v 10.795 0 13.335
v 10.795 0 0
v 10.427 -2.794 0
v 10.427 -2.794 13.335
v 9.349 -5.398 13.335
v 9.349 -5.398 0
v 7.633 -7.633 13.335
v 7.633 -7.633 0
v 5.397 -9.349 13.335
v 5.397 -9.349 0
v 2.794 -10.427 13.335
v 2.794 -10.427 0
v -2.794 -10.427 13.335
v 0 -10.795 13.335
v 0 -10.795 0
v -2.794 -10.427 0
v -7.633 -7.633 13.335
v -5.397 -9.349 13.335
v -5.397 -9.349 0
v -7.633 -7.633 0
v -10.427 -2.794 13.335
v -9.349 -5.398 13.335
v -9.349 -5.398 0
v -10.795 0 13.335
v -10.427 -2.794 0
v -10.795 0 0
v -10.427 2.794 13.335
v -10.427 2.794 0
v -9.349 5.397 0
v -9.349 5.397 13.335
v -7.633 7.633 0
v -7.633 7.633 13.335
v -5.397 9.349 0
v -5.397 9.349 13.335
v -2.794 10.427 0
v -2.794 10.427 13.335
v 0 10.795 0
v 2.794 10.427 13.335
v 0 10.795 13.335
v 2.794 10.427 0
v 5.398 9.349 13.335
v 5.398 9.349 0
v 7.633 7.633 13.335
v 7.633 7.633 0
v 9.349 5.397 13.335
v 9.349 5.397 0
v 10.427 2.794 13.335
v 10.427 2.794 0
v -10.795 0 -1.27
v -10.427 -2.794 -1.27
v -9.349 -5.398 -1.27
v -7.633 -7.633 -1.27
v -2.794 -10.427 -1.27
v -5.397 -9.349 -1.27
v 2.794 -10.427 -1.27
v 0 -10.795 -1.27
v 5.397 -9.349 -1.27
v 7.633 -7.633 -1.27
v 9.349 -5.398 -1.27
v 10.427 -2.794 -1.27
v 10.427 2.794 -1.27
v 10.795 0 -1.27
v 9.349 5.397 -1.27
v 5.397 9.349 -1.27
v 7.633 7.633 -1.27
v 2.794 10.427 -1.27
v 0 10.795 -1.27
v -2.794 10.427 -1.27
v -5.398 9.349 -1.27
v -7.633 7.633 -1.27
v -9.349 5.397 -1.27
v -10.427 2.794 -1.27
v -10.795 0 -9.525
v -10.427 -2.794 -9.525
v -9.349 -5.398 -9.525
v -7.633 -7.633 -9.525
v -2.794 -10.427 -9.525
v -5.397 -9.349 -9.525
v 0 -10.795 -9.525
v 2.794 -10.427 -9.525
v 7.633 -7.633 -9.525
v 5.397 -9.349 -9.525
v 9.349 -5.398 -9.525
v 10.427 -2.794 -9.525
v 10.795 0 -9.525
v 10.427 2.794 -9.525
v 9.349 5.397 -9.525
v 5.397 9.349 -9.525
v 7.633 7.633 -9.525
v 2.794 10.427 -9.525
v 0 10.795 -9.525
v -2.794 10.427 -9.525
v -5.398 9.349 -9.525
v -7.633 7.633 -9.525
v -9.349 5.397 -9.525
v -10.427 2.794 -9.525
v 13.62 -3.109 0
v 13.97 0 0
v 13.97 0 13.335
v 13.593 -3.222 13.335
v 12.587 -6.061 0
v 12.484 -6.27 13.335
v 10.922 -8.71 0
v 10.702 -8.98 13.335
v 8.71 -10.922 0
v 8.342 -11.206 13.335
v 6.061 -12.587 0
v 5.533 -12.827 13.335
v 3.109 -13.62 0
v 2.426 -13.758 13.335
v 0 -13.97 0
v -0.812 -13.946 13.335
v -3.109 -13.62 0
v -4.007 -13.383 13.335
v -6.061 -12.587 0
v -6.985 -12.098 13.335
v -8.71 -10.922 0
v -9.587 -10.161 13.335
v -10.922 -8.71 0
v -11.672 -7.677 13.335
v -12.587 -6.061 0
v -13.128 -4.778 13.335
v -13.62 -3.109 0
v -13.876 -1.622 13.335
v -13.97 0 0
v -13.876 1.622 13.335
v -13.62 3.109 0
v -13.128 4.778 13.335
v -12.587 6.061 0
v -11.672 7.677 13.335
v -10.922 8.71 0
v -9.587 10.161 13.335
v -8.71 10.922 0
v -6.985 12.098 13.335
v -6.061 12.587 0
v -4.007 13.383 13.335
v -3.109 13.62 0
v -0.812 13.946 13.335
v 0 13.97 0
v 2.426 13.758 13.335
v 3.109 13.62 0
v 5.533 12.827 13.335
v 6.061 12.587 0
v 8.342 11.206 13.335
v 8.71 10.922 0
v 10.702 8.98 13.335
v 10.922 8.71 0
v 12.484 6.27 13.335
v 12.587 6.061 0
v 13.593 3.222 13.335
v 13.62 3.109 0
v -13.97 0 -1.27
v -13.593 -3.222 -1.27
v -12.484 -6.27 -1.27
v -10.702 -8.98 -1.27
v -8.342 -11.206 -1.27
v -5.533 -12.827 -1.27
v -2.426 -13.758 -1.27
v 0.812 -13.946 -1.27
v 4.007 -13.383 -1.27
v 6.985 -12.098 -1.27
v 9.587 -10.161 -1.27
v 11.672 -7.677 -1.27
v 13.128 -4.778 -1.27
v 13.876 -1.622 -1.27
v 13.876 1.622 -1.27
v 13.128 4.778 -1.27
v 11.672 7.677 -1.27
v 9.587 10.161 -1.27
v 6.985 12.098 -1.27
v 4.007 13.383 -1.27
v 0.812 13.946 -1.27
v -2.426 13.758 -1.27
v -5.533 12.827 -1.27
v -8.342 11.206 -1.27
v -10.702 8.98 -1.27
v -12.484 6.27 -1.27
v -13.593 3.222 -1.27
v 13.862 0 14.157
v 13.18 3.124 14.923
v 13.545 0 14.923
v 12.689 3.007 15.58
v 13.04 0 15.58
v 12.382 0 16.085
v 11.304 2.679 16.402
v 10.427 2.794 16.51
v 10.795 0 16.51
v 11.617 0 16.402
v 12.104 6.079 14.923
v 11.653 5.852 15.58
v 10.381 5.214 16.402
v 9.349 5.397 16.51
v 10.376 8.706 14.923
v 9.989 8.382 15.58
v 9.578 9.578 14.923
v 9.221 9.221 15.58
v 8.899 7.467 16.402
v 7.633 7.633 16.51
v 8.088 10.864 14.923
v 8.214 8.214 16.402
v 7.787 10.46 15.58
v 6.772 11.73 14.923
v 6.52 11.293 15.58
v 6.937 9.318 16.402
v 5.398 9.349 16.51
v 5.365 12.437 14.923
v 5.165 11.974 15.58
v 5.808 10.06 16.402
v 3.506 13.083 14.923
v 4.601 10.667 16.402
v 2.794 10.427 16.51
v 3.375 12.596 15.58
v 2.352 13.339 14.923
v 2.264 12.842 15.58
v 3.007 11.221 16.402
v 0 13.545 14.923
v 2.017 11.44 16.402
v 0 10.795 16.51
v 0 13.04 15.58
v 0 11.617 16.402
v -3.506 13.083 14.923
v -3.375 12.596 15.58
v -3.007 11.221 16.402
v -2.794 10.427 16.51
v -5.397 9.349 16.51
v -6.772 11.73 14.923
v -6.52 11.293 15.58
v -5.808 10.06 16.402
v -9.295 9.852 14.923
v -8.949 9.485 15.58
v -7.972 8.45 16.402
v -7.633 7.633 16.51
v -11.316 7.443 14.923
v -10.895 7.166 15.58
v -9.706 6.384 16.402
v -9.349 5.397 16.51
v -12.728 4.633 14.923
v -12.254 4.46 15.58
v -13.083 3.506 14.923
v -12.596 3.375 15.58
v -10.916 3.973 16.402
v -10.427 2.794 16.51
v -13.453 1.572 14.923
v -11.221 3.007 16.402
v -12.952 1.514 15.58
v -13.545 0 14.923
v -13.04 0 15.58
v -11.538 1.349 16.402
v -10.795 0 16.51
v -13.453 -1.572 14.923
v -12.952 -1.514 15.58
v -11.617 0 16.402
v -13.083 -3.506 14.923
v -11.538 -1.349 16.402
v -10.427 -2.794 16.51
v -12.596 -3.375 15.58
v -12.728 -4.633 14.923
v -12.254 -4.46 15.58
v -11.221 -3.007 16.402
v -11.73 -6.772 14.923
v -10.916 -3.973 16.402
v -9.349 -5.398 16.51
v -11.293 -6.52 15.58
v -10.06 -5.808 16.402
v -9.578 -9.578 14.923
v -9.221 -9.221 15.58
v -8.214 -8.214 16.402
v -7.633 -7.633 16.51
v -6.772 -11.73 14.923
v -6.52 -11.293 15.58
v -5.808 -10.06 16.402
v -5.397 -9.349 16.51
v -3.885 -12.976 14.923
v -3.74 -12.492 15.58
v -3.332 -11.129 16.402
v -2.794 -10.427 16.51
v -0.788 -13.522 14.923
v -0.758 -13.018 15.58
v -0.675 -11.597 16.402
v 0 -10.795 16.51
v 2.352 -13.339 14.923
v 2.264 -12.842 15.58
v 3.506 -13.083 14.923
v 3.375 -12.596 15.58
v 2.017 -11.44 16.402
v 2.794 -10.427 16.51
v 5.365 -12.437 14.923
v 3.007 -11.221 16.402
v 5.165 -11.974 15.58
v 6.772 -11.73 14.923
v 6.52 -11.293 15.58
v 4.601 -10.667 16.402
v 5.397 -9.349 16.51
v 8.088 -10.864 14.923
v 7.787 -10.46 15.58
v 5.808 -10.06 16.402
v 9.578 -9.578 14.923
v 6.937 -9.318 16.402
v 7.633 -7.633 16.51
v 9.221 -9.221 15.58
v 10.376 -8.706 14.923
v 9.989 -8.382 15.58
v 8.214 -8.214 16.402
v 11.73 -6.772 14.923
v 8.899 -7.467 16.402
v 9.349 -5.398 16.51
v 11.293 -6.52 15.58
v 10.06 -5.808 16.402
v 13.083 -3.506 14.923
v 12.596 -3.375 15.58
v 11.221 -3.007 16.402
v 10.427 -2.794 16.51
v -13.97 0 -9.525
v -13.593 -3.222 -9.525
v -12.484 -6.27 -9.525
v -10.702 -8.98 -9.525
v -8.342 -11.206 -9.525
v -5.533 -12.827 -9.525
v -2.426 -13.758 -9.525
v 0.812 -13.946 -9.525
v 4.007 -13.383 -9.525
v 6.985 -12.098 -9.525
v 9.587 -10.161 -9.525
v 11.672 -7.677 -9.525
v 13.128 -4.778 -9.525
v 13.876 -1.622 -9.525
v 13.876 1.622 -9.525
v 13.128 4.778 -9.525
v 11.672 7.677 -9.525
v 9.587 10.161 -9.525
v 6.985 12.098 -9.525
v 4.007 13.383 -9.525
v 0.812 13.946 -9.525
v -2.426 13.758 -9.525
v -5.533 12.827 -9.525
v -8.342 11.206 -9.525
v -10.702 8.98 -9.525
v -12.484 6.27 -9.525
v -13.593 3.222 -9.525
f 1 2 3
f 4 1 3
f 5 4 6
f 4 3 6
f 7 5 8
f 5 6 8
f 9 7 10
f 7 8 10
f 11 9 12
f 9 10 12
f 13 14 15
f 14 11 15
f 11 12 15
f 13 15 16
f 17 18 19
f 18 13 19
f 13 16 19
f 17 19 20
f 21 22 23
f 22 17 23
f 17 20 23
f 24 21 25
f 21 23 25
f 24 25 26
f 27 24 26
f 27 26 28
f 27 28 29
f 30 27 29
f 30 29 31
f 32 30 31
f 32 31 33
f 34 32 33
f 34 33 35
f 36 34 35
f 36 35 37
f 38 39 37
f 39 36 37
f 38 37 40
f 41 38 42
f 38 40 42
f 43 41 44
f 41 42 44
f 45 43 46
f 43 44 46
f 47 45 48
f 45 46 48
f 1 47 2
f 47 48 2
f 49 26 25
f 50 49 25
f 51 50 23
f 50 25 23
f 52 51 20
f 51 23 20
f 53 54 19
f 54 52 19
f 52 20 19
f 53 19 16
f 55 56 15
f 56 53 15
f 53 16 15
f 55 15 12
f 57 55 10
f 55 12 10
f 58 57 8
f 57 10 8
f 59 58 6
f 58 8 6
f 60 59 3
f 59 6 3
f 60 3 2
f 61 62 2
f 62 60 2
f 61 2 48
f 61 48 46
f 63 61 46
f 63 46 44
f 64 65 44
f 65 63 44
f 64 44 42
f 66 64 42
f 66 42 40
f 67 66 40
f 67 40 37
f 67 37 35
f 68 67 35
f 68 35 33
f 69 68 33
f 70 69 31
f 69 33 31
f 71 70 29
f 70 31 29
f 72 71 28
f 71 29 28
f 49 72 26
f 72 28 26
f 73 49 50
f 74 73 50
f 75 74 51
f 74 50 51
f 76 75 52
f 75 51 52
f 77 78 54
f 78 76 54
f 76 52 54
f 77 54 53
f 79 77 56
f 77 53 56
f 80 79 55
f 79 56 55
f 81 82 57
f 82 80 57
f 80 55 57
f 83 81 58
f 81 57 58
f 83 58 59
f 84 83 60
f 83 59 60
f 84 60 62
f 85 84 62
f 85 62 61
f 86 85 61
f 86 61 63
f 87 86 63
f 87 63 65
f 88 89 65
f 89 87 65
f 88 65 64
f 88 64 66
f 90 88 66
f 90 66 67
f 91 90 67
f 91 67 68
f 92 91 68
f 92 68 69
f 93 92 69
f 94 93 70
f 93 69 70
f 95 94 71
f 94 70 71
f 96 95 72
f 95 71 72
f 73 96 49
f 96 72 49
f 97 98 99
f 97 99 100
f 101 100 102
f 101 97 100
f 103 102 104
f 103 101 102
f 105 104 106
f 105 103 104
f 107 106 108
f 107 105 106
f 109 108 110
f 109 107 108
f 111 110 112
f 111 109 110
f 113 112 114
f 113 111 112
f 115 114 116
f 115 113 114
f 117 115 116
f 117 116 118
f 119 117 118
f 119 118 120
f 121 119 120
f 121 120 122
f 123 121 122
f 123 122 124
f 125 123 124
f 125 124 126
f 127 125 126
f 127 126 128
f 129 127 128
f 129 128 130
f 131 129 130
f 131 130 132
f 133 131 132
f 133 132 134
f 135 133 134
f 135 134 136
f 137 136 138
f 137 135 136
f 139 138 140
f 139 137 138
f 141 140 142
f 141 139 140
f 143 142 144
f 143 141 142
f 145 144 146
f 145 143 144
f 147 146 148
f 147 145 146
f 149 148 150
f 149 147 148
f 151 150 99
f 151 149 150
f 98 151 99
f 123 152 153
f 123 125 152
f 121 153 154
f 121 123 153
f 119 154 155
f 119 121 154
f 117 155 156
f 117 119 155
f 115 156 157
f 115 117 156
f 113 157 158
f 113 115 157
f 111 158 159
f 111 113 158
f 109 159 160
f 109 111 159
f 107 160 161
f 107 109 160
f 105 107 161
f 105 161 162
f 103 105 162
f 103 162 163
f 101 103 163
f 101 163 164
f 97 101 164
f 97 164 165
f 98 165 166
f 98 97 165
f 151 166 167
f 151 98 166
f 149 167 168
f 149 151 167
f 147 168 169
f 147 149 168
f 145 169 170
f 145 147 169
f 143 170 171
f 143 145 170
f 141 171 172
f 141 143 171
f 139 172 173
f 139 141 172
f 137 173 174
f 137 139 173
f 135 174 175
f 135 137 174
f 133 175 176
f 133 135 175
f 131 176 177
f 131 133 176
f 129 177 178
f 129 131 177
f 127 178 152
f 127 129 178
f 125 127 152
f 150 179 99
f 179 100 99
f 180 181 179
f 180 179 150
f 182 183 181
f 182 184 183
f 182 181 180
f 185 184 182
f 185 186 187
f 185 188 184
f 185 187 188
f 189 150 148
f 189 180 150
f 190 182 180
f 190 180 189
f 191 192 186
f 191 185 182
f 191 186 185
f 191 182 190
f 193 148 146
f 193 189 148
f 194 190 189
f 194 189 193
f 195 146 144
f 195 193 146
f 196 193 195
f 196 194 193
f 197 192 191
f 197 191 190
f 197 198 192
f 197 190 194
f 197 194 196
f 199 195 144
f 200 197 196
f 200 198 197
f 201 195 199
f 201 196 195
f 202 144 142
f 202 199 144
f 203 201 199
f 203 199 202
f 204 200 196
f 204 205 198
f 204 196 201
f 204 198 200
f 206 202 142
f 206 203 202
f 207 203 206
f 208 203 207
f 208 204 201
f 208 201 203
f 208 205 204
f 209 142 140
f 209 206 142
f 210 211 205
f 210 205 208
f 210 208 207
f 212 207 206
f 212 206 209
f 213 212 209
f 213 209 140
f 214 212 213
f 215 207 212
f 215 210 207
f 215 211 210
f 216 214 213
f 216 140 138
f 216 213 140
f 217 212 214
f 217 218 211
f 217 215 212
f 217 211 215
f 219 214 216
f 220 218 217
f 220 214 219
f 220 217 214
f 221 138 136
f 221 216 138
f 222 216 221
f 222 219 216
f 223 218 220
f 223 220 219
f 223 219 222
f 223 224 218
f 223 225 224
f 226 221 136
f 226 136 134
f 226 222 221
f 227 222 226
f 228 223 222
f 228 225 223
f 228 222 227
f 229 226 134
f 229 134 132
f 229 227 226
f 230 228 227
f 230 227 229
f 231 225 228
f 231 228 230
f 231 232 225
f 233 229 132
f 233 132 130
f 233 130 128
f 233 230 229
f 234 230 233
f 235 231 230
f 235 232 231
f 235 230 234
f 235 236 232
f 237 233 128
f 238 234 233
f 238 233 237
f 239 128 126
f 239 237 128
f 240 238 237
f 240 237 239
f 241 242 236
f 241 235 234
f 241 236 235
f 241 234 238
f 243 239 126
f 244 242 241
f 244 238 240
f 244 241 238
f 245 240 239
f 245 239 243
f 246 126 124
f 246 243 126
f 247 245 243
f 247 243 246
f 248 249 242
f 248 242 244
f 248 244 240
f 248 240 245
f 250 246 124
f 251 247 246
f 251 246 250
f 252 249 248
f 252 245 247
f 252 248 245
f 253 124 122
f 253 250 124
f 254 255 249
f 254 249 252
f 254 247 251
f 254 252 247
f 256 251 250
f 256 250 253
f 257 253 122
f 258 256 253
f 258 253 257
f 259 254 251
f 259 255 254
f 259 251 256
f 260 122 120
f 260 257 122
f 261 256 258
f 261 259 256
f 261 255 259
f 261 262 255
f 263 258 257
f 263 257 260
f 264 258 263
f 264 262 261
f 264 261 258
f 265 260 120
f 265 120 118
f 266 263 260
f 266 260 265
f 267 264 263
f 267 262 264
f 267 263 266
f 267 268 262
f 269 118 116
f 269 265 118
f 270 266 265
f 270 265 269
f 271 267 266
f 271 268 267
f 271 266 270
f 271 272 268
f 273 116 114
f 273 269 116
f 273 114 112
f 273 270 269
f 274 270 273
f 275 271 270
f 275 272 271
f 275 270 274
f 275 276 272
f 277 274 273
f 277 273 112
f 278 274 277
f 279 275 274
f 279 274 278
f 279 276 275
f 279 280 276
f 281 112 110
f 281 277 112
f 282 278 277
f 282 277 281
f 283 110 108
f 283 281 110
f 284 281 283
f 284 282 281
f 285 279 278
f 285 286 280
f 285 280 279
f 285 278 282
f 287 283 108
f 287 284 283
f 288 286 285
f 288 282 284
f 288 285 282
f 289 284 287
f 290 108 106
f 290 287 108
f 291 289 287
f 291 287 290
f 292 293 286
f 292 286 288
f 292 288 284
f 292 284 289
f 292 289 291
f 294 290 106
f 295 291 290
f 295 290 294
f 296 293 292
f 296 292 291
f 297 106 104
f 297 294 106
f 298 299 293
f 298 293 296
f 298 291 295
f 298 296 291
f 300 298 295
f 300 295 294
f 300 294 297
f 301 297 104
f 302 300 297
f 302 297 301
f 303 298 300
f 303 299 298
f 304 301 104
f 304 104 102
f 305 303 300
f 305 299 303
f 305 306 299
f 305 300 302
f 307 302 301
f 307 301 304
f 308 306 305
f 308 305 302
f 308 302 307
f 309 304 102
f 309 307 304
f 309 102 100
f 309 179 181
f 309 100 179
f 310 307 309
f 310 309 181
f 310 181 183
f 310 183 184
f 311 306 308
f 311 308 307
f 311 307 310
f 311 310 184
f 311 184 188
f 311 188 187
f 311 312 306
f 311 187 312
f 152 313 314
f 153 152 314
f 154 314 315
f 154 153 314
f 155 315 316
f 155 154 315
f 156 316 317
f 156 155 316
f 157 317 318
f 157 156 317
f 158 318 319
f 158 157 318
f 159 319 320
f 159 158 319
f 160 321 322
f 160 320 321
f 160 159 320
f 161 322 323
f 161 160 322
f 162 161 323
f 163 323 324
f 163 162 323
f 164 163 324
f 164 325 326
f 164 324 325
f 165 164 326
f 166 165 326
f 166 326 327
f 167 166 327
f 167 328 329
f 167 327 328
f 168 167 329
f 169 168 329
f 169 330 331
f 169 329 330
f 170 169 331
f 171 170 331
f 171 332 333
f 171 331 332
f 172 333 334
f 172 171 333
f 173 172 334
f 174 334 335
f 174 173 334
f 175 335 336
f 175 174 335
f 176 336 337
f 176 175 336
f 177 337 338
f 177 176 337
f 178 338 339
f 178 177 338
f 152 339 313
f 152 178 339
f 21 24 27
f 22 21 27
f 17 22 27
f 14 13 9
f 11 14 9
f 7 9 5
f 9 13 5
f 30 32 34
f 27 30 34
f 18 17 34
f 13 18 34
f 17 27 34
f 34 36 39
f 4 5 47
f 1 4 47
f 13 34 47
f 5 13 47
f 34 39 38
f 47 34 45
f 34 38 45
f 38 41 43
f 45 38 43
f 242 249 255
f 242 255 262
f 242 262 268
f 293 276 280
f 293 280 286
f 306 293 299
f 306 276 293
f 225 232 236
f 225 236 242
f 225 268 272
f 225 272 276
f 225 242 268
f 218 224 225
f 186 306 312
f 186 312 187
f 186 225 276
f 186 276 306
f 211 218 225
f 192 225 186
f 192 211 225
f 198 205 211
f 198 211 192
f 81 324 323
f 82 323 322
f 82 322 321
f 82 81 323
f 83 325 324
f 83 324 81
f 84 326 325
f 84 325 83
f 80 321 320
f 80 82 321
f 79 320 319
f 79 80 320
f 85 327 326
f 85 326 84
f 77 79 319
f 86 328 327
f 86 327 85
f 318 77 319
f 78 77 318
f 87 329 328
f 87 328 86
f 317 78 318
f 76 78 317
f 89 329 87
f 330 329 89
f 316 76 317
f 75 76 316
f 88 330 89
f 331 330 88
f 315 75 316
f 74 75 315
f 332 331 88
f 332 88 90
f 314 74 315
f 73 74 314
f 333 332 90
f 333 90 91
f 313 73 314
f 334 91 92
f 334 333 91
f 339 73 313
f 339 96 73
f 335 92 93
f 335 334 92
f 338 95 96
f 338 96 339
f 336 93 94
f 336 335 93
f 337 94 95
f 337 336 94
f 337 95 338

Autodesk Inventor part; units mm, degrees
ref_plane "YZ Plane" through (0, 0, 0) normal (1, 0, 0) x (0, 1, 0)
ref_plane "XZ Plane" through (0, 0, 0) normal (0, 1, 0) x (-1, 0, 0)
ref_plane "XY Plane" through (0, 0, 0) normal (0, 0, 1) x (1, 0, 0)
sketch "Sketch1" plane through (0, 0, 0) normal (0, 0, 1) x (1, 0, 0)
  circle A0 centre (0, 0) radius 13.97
  circle A1 centre (0, 0) radius 10.795
  dimension "d0" = 27.94
  dimension "d2" = 21.59
extrude "Extrusion1" add sketch "Sketch1" along normal blind 13.335
sketch "Sketch2" plane through (0, 0, 13.335) normal (0, 0, 1) x (1, 0, 0)
  circle A0 centre (0, 0) radius 13.97 projected
extrude "Extrusion2" add sketch "Sketch2" along normal blind 3.175
fillet "Fillet1" radius 3.175 1 edges at (-13.97, 0, 16.51)
sketch "Sketch3" plane through (0, 0, 0) normal (0, 0, -1) x (-1, 0, 0)
  circle A0 centre (0, 0) radius 10.795 projected
  circle A1 centre (0, 0) radius 13.97 projected
extrude "Extrusion3" add sketch "Sketch3" along normal blind 1.27
sketch "Sketch4" plane through (0, 0, -1.27) normal (0, 0, -1) x (-1, 0, 0)
  circle A0 centre (0, 0) radius 10.795 projected
  circle A1 centre (0, 0) radius 13.97 projected
extrude "Extrusion4" cut sketch "Sketch4" along normal blind 5.715
sketch "Sketch5" plane through (0, 0, -1.27) normal (0, 0, -1) x (-1, 0, 0)
  circle A0 centre (0, 0) radius 10.795 projected
  circle A1 centre (0, 0) radius 13.97 projected
extrude "Extrusion5" add sketch "Sketch5" along normal blind 8.255
properties part number "Long Cap" material "PVC-Piping"
